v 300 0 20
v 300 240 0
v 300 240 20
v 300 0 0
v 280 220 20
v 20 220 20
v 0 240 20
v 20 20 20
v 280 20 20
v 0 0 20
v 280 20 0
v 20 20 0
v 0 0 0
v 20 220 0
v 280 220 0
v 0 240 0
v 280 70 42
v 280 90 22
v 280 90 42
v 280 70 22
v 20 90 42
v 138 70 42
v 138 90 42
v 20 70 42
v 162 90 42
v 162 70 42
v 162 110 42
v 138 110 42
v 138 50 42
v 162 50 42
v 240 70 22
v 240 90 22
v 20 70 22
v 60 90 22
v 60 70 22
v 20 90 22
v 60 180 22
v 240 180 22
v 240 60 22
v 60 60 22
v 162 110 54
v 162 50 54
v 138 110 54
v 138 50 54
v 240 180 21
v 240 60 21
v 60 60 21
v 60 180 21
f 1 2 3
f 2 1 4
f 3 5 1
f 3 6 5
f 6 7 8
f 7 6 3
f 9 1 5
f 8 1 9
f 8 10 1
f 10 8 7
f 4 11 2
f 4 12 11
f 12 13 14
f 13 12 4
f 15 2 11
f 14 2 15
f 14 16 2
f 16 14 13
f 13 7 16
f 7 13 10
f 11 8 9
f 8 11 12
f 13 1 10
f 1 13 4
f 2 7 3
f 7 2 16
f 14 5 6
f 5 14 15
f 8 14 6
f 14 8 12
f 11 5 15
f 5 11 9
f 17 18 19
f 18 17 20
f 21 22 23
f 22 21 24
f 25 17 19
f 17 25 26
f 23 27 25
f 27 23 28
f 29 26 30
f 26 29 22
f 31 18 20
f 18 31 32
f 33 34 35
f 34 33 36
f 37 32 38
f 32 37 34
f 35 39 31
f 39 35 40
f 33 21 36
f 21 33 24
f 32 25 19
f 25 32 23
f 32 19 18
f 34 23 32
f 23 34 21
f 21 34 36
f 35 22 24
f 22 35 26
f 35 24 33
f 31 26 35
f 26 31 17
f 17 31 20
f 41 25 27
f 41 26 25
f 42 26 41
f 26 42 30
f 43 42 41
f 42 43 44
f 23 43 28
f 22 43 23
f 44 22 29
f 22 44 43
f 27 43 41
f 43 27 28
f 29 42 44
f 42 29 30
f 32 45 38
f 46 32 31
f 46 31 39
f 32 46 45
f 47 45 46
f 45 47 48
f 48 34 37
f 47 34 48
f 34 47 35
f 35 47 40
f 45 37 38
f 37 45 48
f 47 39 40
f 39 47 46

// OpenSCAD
// Top-down envelope model only; not a complete machine or fabrication-ready drawing.
// Open in OpenSCAD. Units: mm.
$fn = 32;
frame_x = 300;
frame_y = 240;
rail = 20;
beam_x = 260;
beam_y = 20;
beam_position_y = 70; // gantry location in frame
work_x = 180;
work_y = 120;
module extrusion(x,y,z,dx,dy,dz) { translate([x,y,z]) cube([dx,dy,dz]); }
color("#475569") {
  extrusion(0,0,0,frame_x,rail,rail);
  extrusion(0,frame_y-rail,0,frame_x,rail,rail);
  extrusion(0,rail,0,rail,frame_y-2*rail,rail);
  extrusion(frame_x-rail,rail,0,rail,frame_y-2*rail,rail);
}
color("#2563eb") extrusion((frame_x-beam_x)/2,beam_position_y,22,beam_x,beam_y,20);
color("#db2777") translate([frame_x/2-12,beam_position_y-20,42]) cube([24,60,12]);
color([0.7,0.9,0.4,0.45]) translate([(frame_x-work_x)/2,(frame_y-work_y)/2,21]) cube([work_x,work_y,1]);
// Axes shown in plan view; physical belts, wheels, mounts, motor, idlers and brackets omitted.
